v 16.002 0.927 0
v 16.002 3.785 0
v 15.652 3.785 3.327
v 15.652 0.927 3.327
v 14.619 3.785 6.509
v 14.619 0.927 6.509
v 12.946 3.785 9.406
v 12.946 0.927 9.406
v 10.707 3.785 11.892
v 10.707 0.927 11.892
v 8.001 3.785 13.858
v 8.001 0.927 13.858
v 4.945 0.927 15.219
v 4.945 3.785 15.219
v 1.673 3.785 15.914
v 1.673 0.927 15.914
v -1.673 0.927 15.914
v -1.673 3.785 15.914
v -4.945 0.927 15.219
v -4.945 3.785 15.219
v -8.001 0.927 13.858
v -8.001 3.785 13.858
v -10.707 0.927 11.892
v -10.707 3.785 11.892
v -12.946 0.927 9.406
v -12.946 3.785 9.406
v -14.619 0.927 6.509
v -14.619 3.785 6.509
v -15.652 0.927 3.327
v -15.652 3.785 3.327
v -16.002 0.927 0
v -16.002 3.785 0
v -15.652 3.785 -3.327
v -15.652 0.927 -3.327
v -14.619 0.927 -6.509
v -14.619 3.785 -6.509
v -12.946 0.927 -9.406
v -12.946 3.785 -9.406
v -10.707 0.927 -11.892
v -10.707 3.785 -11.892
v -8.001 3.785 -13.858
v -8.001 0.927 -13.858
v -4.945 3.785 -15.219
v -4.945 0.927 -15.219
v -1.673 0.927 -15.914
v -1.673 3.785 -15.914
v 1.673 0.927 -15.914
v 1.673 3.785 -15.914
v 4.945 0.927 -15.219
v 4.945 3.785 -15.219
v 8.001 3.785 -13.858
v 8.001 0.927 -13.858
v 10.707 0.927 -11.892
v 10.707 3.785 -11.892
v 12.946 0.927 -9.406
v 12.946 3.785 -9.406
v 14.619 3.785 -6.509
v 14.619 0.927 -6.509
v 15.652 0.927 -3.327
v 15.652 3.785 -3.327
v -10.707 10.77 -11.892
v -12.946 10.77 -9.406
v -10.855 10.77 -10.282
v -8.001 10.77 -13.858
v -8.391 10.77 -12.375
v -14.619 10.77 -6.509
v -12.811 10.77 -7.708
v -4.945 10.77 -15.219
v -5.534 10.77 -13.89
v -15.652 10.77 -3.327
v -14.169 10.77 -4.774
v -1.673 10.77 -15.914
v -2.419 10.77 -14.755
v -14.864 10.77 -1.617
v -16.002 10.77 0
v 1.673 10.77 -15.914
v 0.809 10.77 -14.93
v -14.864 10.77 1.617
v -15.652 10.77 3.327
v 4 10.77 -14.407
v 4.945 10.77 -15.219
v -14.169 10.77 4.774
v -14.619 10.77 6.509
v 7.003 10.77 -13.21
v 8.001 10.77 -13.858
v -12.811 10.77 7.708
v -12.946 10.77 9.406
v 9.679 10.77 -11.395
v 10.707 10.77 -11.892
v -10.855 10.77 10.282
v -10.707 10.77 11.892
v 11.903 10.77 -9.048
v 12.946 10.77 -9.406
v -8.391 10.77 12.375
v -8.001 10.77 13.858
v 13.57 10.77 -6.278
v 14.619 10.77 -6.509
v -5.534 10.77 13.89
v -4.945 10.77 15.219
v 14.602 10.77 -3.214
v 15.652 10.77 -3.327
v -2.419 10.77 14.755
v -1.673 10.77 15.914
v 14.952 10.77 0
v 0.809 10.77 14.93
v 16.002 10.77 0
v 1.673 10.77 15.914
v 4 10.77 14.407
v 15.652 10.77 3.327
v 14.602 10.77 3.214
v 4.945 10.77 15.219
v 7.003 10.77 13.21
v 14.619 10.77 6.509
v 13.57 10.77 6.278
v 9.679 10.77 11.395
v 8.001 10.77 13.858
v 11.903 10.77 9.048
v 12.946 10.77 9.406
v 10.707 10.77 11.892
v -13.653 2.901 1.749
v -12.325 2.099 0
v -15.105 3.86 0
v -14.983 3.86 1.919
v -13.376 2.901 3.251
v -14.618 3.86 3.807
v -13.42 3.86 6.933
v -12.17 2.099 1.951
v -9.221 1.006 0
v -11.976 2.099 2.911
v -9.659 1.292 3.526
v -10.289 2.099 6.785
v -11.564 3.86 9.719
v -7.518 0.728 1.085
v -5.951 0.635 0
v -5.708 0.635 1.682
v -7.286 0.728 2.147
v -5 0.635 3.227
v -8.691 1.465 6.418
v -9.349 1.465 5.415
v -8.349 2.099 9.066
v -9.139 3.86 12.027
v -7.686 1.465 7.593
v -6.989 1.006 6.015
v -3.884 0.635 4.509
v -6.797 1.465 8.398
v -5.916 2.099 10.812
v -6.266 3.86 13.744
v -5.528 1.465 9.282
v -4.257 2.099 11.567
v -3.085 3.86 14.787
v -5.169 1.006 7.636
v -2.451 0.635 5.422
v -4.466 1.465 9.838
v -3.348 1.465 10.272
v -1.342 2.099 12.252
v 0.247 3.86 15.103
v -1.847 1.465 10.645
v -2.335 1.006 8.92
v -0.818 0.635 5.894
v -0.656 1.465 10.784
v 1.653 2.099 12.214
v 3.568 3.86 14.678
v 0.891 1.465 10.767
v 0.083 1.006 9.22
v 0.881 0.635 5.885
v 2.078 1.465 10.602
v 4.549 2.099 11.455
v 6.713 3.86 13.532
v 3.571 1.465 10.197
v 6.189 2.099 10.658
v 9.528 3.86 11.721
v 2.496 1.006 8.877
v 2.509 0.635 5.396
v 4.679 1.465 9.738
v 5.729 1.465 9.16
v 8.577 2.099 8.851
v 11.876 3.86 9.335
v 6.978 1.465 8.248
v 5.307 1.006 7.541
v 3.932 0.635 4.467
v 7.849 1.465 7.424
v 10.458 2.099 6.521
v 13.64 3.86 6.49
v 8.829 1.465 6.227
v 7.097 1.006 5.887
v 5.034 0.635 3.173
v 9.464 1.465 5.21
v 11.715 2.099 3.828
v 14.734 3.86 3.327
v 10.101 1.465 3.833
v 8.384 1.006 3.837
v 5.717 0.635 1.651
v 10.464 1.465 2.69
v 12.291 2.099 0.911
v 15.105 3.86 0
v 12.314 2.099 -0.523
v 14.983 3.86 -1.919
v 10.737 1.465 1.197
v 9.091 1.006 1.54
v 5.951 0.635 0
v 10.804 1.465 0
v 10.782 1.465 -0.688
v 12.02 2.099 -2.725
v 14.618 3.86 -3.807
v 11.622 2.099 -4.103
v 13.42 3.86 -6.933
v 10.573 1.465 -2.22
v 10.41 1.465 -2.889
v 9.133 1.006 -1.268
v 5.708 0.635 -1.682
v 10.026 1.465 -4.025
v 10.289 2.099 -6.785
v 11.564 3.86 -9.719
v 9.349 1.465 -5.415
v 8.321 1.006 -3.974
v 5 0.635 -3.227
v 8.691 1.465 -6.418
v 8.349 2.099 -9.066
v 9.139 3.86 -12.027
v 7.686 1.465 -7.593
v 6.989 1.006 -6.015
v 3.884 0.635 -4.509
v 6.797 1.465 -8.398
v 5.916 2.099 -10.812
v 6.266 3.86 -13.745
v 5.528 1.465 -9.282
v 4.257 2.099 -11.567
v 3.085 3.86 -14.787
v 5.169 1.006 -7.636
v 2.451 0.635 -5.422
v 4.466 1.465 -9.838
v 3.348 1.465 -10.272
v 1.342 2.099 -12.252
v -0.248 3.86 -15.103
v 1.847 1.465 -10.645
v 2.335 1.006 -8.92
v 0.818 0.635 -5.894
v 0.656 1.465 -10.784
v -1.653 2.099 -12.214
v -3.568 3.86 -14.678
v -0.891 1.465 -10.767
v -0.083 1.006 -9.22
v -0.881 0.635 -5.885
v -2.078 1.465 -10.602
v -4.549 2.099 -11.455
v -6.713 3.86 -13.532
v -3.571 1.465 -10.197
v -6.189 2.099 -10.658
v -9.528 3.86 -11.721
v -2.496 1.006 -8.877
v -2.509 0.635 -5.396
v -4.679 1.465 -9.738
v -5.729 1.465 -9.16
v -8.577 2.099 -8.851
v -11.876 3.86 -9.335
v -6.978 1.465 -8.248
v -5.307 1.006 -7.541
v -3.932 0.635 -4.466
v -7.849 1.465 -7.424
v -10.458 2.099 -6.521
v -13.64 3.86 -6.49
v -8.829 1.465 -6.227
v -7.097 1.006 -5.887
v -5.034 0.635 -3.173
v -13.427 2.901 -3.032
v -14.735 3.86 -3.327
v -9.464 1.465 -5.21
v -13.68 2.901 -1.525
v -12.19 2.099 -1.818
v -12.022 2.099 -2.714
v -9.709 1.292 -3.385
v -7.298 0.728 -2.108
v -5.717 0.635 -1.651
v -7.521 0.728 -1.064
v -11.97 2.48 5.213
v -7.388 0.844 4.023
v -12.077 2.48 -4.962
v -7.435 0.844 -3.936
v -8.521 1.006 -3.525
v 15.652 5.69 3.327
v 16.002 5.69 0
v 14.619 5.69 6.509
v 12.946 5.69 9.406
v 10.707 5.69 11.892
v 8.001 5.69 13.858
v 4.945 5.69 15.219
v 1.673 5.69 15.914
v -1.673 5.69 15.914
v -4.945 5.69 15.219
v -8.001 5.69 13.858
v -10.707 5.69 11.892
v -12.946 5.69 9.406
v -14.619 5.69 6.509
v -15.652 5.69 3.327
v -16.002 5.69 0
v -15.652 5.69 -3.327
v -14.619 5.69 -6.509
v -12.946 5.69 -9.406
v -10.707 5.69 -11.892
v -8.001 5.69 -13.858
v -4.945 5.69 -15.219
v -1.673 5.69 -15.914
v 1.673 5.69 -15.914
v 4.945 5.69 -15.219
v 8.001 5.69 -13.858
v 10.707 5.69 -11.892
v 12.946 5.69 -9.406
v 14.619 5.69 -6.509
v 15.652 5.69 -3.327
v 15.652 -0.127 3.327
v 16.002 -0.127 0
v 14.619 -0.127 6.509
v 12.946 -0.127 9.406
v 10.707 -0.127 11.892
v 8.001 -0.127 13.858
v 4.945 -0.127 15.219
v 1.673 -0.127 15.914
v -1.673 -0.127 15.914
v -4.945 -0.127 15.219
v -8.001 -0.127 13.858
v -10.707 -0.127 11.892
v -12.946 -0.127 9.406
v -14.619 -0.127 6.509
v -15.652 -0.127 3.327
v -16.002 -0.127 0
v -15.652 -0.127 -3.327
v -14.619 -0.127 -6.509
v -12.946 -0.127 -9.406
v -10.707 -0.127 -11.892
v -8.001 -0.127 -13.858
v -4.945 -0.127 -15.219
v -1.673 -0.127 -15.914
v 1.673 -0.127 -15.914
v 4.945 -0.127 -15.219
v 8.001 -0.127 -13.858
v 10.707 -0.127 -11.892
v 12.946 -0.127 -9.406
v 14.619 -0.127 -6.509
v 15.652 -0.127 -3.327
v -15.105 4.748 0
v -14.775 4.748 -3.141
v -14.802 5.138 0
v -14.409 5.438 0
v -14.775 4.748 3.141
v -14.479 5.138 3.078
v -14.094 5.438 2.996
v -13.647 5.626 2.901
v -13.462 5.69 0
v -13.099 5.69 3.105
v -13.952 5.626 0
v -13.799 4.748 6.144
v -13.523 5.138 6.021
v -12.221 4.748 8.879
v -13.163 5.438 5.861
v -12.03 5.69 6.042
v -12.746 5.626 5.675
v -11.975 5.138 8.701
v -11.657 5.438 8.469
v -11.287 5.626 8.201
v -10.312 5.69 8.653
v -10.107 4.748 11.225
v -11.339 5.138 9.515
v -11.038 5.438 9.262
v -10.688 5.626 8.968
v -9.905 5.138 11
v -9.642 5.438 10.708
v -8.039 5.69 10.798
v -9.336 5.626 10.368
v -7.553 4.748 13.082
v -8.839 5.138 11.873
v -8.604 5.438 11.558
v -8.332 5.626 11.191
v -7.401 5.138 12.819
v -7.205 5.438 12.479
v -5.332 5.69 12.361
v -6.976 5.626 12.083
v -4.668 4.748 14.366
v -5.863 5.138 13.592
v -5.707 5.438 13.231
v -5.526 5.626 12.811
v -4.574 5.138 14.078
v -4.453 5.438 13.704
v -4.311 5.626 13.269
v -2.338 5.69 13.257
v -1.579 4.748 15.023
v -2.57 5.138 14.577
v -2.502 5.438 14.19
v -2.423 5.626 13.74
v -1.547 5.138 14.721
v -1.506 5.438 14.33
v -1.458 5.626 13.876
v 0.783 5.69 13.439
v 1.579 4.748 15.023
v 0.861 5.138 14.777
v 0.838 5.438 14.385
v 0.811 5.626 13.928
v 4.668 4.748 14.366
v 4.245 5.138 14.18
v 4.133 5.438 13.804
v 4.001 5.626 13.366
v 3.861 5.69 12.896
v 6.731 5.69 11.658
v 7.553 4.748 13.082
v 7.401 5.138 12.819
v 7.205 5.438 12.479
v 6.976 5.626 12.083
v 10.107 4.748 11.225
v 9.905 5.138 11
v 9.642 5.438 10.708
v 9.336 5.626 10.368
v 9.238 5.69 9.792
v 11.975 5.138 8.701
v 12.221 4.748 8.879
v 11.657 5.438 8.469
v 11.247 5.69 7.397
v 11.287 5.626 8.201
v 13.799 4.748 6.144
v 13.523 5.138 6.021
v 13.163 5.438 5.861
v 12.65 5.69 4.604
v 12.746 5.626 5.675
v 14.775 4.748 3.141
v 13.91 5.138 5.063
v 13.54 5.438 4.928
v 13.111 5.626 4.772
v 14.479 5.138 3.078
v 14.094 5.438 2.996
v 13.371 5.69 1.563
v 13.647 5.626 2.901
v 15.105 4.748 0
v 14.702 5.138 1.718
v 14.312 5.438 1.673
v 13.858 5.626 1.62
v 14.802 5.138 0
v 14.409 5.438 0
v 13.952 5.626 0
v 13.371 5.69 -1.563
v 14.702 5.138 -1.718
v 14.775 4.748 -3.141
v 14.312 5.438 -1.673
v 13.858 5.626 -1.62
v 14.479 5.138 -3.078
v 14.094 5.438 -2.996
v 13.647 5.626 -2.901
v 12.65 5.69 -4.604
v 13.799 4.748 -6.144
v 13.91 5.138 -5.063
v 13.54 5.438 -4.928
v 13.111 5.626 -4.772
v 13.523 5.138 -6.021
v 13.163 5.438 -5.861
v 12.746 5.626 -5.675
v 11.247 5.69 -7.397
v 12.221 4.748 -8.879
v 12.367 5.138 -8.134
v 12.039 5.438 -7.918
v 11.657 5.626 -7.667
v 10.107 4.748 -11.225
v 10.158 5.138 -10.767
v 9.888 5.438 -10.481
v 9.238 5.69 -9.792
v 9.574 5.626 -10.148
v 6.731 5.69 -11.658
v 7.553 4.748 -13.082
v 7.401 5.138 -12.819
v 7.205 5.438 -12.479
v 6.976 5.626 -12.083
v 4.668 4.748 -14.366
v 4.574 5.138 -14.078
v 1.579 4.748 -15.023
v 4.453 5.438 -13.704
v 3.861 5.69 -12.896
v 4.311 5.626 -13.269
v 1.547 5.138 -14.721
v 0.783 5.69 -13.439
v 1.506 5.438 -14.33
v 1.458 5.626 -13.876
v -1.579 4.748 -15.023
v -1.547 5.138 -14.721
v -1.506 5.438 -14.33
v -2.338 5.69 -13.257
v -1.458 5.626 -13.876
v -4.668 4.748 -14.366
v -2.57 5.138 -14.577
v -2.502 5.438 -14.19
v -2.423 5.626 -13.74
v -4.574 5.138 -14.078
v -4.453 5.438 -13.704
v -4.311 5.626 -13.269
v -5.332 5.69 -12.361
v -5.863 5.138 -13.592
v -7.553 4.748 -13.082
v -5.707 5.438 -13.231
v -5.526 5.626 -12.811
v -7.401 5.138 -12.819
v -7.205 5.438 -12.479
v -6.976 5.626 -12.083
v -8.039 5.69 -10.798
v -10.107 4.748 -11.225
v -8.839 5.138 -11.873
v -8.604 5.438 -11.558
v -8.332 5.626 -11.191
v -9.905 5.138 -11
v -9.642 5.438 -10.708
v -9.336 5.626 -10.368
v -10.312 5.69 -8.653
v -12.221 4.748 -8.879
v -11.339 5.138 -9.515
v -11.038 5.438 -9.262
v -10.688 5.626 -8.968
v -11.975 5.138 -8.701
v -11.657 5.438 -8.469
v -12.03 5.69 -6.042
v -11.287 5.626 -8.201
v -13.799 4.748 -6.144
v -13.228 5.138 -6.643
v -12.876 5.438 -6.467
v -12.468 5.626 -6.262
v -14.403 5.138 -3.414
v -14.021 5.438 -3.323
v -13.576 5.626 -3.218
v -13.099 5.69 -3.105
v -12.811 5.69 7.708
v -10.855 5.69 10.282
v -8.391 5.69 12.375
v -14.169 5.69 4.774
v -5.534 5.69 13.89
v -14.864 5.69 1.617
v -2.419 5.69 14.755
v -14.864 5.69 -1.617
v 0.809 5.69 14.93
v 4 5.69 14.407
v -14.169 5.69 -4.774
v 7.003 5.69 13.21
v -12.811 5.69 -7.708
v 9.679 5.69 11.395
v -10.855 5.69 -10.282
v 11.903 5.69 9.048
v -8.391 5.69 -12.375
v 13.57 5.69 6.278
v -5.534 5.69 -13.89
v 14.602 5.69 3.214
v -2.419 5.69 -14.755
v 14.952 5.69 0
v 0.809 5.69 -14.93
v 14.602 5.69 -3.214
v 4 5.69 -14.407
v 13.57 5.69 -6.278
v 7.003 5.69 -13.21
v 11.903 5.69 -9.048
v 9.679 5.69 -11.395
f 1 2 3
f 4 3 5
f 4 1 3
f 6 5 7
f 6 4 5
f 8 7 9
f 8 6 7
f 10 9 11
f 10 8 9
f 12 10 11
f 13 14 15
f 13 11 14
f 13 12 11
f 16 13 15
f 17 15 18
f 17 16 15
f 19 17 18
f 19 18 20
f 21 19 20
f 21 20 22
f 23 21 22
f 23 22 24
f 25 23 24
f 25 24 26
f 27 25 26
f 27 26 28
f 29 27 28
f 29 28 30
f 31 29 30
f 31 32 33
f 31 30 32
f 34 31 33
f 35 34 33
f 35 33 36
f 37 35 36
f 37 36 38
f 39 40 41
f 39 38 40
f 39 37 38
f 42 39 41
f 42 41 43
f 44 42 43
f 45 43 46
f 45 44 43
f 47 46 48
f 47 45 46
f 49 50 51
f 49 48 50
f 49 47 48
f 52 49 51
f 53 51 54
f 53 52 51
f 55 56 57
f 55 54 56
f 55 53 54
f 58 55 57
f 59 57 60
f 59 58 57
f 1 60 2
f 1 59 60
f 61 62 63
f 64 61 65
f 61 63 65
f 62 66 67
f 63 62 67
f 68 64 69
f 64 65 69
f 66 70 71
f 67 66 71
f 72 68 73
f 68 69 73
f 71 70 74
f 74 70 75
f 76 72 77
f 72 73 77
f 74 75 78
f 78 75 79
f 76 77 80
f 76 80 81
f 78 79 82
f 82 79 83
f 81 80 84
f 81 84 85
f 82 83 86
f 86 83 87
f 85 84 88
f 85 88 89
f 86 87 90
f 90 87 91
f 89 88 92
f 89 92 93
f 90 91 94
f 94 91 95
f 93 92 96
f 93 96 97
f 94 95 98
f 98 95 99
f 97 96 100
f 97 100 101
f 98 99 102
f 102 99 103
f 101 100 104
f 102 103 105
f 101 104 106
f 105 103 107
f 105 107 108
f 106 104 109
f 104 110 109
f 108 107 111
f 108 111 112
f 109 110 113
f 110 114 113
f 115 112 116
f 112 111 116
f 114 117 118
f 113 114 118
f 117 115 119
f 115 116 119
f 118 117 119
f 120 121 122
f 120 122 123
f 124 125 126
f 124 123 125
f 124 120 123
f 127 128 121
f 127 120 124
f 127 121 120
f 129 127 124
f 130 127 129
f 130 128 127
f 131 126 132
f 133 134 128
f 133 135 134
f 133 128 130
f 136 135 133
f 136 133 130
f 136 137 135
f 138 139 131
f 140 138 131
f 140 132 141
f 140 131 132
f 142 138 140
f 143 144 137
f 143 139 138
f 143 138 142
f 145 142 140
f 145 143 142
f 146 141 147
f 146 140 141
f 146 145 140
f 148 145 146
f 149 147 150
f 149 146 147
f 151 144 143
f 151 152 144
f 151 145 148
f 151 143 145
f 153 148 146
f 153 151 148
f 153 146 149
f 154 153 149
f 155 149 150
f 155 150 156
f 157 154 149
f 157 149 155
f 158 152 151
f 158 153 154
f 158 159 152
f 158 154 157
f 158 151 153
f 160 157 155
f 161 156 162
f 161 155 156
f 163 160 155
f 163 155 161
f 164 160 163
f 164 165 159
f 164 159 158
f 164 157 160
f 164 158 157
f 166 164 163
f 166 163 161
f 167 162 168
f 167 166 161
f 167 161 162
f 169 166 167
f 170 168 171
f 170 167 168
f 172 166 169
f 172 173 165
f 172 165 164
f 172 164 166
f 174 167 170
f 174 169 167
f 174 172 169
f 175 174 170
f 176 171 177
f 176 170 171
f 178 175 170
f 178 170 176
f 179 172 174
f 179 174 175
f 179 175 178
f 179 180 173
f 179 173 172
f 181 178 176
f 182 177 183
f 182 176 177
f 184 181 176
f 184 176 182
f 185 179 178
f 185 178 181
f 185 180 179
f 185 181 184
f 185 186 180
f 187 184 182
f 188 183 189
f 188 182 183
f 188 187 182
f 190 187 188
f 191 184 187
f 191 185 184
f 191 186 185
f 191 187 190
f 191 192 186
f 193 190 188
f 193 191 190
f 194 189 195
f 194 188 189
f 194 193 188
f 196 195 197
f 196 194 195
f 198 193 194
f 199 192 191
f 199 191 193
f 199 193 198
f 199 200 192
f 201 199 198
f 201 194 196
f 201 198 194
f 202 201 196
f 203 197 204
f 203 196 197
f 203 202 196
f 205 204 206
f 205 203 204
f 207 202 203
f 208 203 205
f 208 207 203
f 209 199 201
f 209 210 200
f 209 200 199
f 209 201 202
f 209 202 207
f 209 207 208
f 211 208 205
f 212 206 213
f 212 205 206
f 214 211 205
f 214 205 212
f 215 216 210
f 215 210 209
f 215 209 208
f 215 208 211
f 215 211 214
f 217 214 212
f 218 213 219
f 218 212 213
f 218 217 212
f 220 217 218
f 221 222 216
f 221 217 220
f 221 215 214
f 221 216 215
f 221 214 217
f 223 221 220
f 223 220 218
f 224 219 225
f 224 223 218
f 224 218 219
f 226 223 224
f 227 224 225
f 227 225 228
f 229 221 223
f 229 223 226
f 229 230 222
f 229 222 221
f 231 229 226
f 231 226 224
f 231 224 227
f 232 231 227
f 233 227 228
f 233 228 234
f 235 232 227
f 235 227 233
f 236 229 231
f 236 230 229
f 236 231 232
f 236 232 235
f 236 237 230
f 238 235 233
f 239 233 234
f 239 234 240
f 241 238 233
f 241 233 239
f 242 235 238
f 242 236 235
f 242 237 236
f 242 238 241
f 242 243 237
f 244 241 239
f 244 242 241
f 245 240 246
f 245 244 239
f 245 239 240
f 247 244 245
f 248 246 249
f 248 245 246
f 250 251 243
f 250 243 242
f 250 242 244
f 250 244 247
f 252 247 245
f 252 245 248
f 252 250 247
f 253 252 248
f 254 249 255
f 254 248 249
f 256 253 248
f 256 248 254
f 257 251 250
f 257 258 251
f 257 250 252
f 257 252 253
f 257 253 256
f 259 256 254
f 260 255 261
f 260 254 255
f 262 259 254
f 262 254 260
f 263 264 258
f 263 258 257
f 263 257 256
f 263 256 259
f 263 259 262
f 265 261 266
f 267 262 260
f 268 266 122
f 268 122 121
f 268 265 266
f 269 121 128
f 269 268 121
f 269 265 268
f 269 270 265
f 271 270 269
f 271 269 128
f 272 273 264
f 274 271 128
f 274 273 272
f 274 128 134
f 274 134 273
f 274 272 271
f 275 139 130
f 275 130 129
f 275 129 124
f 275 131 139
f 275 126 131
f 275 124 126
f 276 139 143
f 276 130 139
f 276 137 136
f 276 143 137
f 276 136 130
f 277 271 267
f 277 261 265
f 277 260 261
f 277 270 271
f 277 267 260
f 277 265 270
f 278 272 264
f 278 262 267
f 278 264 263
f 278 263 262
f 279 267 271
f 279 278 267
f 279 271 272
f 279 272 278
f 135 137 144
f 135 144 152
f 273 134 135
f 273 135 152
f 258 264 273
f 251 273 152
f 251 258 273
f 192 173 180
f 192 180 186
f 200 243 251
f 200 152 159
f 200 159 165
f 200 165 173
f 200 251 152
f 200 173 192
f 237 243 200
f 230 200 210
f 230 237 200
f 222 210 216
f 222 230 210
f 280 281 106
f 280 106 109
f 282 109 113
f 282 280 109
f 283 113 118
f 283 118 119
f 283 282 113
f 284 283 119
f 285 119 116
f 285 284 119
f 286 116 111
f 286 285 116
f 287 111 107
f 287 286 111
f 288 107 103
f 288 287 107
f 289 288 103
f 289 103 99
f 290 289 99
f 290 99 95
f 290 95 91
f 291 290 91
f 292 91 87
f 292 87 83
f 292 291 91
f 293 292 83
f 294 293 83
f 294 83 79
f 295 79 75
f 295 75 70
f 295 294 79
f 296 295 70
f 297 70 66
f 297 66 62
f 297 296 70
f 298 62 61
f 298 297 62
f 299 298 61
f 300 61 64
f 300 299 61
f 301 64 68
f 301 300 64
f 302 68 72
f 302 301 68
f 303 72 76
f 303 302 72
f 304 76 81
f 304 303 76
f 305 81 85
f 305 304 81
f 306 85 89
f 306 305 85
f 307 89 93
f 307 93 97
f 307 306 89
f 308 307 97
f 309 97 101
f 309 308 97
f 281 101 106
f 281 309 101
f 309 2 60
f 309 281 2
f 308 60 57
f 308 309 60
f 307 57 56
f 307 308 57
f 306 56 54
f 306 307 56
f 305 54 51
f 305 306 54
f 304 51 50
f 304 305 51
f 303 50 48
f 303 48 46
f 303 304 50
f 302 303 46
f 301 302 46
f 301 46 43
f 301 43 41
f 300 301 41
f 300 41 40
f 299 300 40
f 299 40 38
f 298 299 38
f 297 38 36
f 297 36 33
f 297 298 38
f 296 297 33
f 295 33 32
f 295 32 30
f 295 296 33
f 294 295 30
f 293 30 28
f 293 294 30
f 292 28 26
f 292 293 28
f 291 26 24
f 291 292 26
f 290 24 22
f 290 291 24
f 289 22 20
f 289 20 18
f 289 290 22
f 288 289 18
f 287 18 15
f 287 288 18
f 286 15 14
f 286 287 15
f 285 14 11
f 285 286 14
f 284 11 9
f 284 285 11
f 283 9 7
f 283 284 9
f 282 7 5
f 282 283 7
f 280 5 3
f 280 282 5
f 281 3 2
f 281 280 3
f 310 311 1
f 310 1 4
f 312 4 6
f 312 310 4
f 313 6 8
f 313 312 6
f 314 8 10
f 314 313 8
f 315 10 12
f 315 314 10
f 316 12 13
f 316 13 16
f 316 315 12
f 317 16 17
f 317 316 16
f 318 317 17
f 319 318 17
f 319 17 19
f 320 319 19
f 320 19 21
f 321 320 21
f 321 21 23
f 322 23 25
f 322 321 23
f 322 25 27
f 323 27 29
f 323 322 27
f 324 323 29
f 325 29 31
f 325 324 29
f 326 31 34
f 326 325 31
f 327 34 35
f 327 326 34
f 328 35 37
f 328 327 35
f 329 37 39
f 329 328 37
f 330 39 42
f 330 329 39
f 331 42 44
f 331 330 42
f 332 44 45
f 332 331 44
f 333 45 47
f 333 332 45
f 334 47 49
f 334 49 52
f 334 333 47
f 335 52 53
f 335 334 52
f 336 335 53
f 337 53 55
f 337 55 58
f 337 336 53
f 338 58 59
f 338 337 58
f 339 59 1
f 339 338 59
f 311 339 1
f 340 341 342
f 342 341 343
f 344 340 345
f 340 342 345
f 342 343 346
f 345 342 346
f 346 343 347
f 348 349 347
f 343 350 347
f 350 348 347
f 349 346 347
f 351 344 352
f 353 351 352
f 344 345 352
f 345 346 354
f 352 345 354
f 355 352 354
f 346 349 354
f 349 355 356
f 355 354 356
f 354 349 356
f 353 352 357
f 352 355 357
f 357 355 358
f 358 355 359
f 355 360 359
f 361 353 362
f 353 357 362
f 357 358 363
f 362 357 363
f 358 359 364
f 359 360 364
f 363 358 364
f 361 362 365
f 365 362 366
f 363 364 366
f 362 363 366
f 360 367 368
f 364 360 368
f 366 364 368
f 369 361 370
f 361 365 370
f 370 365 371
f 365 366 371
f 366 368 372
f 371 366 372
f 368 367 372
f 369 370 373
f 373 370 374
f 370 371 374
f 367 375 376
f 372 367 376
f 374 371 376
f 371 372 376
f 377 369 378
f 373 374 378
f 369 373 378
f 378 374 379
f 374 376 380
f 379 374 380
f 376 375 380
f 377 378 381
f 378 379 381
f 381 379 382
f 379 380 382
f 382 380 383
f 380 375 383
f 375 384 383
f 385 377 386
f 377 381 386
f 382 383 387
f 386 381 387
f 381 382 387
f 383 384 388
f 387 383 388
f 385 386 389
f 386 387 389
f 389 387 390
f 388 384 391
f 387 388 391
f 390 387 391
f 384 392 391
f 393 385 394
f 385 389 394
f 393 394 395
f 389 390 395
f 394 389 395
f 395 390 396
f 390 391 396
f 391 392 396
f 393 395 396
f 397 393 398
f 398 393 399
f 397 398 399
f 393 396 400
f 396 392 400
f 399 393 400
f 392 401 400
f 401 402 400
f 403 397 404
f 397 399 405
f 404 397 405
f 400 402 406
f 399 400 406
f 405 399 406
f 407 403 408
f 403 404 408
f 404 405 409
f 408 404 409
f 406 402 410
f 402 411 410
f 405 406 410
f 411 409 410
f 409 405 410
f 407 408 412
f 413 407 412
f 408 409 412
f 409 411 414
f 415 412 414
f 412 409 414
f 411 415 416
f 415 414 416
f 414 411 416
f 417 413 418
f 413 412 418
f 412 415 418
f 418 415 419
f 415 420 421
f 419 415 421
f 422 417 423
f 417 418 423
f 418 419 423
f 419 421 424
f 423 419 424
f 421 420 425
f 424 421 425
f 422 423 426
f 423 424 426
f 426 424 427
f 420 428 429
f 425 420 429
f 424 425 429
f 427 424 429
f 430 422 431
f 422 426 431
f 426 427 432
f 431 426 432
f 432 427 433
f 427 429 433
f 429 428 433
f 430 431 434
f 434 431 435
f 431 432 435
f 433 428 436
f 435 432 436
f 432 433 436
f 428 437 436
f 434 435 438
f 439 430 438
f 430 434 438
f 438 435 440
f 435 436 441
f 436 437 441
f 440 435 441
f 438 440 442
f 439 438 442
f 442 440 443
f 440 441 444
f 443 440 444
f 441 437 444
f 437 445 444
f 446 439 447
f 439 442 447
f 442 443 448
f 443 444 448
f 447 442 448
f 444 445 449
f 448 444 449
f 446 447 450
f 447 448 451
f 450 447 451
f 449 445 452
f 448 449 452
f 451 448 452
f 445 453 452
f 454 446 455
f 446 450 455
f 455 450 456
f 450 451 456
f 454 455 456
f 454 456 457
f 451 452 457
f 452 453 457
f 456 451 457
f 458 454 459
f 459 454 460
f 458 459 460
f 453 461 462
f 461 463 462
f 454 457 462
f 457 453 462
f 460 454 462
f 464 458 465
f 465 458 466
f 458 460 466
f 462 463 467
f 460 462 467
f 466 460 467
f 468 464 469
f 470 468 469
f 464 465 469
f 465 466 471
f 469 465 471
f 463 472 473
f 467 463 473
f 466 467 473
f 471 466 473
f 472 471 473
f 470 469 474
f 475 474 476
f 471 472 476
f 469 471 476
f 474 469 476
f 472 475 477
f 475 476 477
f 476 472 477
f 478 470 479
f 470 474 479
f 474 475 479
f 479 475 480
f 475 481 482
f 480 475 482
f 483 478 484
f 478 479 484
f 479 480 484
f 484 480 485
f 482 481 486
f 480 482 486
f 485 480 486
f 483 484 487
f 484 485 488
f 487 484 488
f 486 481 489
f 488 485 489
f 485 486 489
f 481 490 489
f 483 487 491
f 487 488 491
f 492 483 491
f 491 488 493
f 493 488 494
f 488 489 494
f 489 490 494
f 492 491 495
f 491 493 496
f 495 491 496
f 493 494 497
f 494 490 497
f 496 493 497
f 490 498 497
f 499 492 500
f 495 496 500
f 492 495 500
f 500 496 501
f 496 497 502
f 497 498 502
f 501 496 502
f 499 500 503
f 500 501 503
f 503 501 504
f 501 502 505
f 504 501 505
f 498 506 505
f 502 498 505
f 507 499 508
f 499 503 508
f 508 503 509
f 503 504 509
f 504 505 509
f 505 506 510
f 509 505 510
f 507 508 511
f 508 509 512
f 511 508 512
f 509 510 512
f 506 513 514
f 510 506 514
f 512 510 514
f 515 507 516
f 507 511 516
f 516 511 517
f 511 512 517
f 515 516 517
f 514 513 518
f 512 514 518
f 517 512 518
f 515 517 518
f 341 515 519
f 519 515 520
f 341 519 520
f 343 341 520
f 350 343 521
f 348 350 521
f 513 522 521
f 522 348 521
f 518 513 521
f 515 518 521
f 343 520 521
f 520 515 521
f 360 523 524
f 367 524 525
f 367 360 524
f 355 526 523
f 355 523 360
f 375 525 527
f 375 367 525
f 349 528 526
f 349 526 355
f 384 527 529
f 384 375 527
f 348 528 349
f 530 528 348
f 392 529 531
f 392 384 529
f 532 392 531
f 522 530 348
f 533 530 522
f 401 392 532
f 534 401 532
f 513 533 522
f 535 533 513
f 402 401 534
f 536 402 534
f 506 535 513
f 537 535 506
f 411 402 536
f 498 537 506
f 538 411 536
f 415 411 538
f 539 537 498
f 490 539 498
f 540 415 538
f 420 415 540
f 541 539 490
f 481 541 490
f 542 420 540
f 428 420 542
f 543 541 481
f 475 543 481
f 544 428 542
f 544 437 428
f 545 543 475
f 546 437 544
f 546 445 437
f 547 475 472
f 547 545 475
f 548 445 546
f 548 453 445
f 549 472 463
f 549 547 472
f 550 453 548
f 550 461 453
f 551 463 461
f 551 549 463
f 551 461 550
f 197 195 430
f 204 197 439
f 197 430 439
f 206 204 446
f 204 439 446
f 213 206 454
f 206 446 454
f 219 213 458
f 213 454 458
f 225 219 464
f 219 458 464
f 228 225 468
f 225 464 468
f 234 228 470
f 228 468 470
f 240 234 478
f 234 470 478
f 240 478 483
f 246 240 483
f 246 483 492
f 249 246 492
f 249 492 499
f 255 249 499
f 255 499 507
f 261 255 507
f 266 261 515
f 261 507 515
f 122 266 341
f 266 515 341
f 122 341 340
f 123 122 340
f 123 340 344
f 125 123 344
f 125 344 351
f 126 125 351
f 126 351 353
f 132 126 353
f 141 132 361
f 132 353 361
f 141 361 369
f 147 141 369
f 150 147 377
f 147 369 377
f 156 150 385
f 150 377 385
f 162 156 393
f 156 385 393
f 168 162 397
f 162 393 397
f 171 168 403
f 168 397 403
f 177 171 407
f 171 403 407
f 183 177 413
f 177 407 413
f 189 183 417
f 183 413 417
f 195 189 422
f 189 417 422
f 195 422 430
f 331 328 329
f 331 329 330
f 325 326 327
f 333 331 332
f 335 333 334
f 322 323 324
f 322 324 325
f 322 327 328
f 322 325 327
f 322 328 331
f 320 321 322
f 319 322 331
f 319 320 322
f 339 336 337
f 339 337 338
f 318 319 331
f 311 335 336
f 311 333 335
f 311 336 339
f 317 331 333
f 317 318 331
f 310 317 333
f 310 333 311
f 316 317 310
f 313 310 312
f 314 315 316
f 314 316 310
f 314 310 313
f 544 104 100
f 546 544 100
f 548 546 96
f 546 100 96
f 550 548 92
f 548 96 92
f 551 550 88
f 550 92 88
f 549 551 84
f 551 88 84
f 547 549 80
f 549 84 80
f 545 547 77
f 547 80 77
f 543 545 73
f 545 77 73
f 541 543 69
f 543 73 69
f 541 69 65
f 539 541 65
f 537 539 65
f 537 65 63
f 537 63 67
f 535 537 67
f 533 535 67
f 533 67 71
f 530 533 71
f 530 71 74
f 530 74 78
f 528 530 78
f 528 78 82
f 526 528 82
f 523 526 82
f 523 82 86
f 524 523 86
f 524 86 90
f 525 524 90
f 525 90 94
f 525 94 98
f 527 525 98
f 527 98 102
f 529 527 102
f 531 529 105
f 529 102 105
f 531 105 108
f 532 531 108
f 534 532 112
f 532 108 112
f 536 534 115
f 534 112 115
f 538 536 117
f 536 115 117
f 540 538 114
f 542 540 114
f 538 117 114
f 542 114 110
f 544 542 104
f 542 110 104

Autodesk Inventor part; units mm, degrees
ref_plane "YZ Plane" through (0, 0, 0) normal (1, 0, 0) x (0, 1, 0)
ref_plane "XZ Plane" through (0, 0, 0) normal (0, 1, 0) x (-1, 0, 0)
ref_plane "XY Plane" through (0, 0, 0) normal (0, 0, 1) x (1, 0, 0)
sketch "Sketch1" plane through (0, 0, 0) normal (0, 1, 0) x (-1, 0, 0)
  circle A0 centre (0, 0) radius 16.002
  dimension "d0" = 32.004
extrude "Extrusion1" add sketch "Sketch1" along normal blind 6.3246
sketch "Sketch2" plane through (0, 6.3246, 0) normal (0, 1, 0) x (1, 0, 0)
  circle A0 centre (0, 0) radius 13.335
  dimension "d3" = 26.67
extrude "Extrusion2" add sketch "Sketch2" along normal blind 1.1176
fillet "Fillet1" radius 2.54 1 edges at (16.002, 6.3246, 0)
fillet "Fillet2" radius 15.24 1 edges at (16.002, 0, 0)
fillet "Fillet3" radius 0.254 1 edges at (-13.335, 7.4422, 0)
shell "Shell1" thickness 0.635 removed faces 3 at (13.1616, 7.2072, 2.139) at (13.2918, 6.9003, 1.073) at (2.477, 7.4422, -4.5655)
sketch "Sketch3" plane through (0, 0.635, 0) normal (0, 1, 0) x (1, 0, 0)
  circle A0 centre (0, 0) radius 5.9506
extrude "Extrusion3" cut sketch "Sketch3" against normal blind 25.4
extrude "Extrusion4" add sketch "Sketch3" against normal blind 0.762
sketch "Sketch5" plane through (0, -0.127, 0) normal (0, -1, 0) x (1, 0, 0)
  circle A0 centre (0, 0) radius 16.002
extrude "Extrusion6" add sketch "Sketch5" against normal up to next
sketch "Sketch7" plane through (0, 5.6896, 0) normal (0, -1, 0) x (1, 0, 0)
  circle A0 centre (0, 0) radius 15.3471
  circle A1 centre (0, 0) radius 16.002
extrude "Extrusion7" add sketch "Sketch7" against normal blind 5.08 contours A0 | A1
sketch "Sketch8" plane through (0, 10.7696, 0) normal (0, 1, 0) x (1, 0, 0)
  circle A0 centre (0, 0) radius 14.9515
extrude "Extrusion8" cut sketch "Sketch8" against normal blind 5.08
sketch "Sketch9" plane through (0, 5.6896, 0) normal (0, -1, 0) x (1, 0, 0)
  circle A0 centre (0, 0) radius 16.002
  circle A1 centre (0, 0) radius 15.1054
extrude "Extrusion9" add sketch "Sketch9" along normal blind 4.7625
sketch "Sketch11" plane through (0, 5.6896, 0) normal (0, 1, 0) x (1, 0, 0)
  circle A0 centre (0, 0) radius 13.462 projected
  arc A1 (0, 13.462) -> (-13.462, 0) centre (0, 0) ccw
  arc A2 (13.462, 0) -> (0, 13.462) centre (0, 0) ccw
  arc A3 (-0.0694, -13.4618) -> (13.462, 0) centre (0, 0) ccw
properties part number "befor"
